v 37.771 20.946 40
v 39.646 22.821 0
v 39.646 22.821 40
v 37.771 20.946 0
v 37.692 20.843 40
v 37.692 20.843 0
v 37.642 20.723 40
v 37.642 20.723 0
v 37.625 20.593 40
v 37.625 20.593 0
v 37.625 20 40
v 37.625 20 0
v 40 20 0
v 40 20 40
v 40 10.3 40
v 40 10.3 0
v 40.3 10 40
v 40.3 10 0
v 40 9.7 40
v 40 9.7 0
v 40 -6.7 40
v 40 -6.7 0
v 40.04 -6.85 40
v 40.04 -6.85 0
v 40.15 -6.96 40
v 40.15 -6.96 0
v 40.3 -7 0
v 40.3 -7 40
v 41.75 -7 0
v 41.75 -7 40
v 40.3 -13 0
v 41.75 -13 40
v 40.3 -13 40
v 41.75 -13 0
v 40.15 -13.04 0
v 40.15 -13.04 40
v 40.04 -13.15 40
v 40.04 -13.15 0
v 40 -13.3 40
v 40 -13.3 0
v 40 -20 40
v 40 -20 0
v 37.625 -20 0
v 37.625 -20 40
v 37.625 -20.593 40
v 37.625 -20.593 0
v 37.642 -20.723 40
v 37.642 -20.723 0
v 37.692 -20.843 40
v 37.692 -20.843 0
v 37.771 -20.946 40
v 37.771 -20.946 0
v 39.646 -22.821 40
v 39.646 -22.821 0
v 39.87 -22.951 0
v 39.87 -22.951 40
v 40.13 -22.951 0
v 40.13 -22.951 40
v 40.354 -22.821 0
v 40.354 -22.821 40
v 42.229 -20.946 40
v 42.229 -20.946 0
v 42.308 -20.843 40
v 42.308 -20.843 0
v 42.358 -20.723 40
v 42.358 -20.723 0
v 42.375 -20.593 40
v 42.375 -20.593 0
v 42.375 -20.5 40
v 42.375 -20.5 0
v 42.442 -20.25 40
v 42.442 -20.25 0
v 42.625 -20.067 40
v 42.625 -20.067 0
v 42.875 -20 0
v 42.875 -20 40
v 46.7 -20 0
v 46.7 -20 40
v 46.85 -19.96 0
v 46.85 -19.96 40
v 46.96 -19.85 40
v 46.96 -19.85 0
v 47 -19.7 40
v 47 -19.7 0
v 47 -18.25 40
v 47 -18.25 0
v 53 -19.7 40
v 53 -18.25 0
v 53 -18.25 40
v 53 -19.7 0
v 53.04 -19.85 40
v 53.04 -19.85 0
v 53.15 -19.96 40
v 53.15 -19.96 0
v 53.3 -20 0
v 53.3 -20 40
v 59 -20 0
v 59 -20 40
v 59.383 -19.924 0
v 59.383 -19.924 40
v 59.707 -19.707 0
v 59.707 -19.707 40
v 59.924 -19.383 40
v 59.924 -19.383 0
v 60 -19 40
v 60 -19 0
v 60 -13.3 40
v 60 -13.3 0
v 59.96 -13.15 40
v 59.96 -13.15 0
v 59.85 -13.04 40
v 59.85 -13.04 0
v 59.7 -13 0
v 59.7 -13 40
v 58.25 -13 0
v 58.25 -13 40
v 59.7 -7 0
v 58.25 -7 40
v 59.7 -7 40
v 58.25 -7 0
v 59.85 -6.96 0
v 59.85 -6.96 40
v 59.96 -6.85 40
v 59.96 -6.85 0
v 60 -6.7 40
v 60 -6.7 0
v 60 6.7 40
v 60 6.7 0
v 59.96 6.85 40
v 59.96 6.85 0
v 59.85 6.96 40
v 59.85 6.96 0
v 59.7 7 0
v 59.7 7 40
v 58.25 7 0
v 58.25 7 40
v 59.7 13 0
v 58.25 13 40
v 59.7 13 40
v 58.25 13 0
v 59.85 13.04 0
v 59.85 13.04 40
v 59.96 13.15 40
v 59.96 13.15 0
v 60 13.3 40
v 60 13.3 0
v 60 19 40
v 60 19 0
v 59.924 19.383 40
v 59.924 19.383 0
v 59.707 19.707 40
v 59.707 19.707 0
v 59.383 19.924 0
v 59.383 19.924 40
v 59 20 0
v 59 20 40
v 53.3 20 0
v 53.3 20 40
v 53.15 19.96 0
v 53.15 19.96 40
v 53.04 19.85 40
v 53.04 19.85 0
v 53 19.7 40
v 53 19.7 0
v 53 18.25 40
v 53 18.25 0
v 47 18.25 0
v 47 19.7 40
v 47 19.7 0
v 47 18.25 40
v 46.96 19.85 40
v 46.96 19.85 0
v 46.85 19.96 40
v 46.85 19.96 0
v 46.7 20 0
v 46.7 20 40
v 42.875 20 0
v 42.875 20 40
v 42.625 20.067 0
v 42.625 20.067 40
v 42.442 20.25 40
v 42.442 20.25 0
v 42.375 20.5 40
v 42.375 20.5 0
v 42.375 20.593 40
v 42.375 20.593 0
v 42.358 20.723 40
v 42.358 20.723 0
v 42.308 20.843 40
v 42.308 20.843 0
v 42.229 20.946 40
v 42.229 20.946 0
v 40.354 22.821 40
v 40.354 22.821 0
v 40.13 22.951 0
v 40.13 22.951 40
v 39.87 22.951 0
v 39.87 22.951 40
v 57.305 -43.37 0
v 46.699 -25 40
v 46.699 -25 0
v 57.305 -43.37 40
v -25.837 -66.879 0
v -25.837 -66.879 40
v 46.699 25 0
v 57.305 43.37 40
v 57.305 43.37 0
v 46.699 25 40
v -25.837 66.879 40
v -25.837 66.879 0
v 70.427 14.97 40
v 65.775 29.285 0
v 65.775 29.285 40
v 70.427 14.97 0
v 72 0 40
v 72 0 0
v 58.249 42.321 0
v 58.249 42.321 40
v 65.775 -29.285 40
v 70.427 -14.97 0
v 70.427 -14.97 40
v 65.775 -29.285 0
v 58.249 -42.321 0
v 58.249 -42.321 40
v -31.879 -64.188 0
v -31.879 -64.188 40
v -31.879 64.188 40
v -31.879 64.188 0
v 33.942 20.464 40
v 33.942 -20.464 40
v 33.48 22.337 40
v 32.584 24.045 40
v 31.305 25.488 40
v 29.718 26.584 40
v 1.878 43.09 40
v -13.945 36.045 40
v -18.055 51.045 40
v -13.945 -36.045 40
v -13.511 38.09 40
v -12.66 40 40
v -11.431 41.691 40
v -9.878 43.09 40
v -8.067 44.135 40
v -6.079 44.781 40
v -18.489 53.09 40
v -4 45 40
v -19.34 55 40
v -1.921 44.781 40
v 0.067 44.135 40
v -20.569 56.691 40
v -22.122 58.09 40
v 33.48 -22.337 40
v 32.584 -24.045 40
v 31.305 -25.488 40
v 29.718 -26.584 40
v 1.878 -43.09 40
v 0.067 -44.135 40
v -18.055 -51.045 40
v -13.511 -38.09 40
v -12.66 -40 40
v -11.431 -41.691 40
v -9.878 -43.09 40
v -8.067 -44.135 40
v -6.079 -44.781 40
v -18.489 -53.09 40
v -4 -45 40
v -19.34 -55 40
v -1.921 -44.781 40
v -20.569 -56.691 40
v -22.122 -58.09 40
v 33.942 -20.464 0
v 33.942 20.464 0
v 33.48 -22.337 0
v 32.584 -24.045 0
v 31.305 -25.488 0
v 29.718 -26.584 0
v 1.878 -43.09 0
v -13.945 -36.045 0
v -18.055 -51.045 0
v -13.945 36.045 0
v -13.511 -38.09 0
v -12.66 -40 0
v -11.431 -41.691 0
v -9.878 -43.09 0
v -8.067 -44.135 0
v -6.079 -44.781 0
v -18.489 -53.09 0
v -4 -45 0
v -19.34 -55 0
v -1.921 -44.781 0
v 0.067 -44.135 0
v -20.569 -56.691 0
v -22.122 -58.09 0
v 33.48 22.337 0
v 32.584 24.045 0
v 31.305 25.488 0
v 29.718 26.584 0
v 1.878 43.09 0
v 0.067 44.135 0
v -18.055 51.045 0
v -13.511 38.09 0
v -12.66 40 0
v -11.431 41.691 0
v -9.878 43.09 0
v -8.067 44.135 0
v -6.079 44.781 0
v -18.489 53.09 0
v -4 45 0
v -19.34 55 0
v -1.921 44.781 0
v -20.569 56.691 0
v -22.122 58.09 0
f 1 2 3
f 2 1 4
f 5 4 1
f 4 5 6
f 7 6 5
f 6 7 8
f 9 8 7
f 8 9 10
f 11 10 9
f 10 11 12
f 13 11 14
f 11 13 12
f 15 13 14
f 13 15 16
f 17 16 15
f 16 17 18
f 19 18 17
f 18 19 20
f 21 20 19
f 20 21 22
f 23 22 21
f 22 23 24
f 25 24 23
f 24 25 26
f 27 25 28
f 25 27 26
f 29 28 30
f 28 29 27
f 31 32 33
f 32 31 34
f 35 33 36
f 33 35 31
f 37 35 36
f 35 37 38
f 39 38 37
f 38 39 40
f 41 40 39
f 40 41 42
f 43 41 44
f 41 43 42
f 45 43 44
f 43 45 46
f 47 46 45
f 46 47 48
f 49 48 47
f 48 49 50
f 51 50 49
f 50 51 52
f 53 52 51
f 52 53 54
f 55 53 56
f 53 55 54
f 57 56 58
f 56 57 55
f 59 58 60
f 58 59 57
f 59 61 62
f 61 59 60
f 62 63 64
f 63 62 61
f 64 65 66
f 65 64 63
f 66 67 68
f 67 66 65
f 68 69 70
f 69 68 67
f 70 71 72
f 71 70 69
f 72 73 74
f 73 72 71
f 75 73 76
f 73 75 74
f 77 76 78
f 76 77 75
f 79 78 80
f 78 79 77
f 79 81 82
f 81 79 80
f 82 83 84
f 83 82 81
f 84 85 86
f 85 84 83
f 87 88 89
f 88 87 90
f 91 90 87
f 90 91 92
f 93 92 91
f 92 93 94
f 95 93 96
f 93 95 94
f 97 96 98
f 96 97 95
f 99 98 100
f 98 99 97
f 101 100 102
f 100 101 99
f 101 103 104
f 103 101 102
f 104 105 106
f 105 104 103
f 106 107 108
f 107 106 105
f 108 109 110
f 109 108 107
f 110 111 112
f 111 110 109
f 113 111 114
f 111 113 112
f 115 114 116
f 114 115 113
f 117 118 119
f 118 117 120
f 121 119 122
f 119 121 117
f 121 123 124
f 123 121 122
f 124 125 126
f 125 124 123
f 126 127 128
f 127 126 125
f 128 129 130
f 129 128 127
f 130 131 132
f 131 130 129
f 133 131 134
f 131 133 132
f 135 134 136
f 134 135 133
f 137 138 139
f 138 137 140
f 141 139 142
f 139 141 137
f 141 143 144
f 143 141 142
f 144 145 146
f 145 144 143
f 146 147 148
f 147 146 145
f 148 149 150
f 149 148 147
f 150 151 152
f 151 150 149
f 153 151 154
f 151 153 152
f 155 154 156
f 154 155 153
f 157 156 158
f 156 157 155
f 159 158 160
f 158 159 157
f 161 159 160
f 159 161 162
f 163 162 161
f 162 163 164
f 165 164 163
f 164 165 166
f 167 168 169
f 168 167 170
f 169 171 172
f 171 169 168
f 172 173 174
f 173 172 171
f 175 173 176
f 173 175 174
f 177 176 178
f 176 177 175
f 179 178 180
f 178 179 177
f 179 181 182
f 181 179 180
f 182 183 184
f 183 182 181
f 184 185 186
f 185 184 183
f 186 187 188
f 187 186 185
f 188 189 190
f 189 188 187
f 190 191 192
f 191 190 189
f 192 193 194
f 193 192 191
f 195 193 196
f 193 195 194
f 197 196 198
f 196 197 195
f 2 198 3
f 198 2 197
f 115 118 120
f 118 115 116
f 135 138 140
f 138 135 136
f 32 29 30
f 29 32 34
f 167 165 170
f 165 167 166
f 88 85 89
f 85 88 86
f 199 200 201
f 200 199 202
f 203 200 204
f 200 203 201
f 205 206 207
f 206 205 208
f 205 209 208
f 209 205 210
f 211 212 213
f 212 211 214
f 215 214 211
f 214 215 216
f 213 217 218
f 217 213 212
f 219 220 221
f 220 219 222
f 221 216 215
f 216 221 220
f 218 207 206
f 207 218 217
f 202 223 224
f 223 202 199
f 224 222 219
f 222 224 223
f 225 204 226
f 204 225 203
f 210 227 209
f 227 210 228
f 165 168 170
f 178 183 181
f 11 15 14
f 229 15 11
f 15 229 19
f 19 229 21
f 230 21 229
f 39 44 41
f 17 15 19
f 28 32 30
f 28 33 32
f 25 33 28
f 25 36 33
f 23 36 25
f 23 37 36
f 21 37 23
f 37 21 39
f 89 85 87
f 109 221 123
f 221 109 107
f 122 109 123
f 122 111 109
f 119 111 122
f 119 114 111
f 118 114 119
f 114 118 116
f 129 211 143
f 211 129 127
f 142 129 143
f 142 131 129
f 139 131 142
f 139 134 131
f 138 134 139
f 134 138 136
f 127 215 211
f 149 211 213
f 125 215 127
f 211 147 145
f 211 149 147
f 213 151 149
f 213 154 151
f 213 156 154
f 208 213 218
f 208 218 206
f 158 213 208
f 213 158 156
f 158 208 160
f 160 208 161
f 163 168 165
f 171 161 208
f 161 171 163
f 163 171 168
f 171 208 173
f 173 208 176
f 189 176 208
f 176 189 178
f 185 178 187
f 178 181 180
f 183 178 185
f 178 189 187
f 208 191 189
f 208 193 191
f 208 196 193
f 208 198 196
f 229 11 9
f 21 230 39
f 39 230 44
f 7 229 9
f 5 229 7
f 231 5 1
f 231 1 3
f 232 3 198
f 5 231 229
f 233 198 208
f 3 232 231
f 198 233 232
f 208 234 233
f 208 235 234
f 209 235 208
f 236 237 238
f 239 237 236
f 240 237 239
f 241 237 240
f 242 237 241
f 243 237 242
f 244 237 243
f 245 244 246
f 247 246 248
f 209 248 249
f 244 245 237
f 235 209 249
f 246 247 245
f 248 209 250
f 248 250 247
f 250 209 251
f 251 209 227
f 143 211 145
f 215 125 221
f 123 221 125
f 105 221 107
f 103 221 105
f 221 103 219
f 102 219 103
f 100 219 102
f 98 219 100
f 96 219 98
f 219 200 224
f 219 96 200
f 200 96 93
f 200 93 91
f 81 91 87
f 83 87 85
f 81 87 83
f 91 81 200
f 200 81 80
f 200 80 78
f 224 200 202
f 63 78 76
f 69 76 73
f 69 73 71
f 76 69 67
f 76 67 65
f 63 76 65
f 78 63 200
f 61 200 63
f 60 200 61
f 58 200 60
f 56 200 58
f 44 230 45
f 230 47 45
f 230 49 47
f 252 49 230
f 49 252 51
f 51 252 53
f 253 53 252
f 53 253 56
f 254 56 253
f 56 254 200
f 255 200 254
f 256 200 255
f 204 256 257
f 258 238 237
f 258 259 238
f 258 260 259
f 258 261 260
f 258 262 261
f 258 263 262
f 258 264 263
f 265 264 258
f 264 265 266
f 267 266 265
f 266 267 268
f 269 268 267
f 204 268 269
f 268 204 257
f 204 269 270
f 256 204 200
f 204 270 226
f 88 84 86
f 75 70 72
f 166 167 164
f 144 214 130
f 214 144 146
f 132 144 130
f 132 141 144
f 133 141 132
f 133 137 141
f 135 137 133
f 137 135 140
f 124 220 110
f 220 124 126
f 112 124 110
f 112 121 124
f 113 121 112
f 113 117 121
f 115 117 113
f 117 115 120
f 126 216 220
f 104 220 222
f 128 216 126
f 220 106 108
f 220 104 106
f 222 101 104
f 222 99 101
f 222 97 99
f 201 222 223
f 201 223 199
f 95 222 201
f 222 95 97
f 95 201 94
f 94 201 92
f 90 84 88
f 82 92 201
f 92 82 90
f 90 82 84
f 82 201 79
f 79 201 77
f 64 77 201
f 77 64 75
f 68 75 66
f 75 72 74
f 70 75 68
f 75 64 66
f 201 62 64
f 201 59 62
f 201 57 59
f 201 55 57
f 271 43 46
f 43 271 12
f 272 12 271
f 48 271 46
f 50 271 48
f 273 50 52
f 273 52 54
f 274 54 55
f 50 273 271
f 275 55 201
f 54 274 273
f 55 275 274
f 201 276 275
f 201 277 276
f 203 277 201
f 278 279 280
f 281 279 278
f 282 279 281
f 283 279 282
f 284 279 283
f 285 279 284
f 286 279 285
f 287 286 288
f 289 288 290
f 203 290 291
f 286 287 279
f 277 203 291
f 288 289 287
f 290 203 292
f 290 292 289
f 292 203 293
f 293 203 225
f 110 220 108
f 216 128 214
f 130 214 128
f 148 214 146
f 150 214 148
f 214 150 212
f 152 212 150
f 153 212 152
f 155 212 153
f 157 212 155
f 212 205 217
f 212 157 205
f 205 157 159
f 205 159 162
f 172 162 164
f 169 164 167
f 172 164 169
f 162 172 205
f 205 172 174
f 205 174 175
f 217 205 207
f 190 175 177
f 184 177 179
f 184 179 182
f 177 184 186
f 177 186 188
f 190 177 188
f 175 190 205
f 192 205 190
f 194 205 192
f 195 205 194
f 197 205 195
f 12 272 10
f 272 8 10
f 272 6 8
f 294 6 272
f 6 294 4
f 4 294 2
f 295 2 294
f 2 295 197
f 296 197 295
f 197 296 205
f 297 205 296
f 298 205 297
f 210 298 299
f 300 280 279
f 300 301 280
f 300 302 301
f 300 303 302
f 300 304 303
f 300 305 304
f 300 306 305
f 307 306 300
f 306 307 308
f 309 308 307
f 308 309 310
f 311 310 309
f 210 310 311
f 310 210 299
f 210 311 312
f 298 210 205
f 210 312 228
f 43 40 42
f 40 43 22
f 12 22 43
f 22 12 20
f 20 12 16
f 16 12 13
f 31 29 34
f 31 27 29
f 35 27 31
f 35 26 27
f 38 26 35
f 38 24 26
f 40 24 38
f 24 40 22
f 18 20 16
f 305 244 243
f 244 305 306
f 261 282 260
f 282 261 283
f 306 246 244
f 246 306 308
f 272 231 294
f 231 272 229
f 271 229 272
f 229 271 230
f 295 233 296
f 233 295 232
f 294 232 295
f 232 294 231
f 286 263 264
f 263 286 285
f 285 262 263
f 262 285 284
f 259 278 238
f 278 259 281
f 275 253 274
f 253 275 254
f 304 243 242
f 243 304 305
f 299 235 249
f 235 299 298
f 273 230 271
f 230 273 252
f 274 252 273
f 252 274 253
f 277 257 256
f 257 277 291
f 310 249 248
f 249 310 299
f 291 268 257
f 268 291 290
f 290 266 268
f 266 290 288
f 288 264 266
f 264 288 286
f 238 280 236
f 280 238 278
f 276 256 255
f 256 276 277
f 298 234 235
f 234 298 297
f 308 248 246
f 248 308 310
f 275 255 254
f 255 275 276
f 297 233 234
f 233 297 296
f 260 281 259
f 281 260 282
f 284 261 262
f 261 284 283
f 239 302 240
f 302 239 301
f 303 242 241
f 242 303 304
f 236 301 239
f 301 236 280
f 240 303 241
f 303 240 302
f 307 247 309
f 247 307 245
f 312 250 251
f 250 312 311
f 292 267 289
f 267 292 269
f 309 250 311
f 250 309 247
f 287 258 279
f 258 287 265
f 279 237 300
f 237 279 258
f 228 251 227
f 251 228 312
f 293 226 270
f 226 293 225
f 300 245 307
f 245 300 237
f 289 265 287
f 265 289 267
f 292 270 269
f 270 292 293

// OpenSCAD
// file: makerslide.scad
module makerslide(h=100) {
	linear_extrude(height=h, center=true, convexity = 10)
		import("makerslide/makerslide_extrusion_profile.dxf");
}

makerslide(50);
// main file
use <makerslide.scad>

thick= 4;
extrusion_width= 40;
extrusion_height= 20;
base_cylinder_r= 72;
arm_length= 60;

frame_motor();
//spool_cutout();

module cutout(clearance=0.1) {
	t= 3.5;
	union() {
		translate([10,0,extrusion_width/2]) rotate([0, 0, 180]) makerslide(extrusion_width+2);
		translate([0,0,extrusion_width/2]) cube([20-t,40-t,extrusion_width+2], center= true);
	}
}

module frame_motor() {
	difference() {
		cylinder(r=base_cylinder_r, h=extrusion_width);
		// makerslide cutout
		translate([extrusion_height/2+40,0,-0.5]) cutout();
		// cutout arms
		translate([90,0,-1]) arms();
		// back cutout
		translate([0,0,-1]) rotate([0, 0, -90]) spool_cutout();
		// motor cutout
		translate([-58,0,-1]) rotate([0, 0, -90]) motor_cutout();	
	}
}

module arms() {
	rotate([0,0,30]) translate([-200, -extrusion_height*2,0]) cube([150, extrusion_height*2, extrusion_width+2]);
	rotate([0,0,-30]) translate([-200, 0,0]) cube([150, extrusion_height*2, extrusion_width+2]);
}

module spool_cutout() {
	r1= 10;
	r2= 8;
	t1= 90-r1*2;
	t2= 55-r2*2;
	d= 30;
	translate([0,-4,0]) linear_extrude(height= extrusion_width+2) hull() {
		translate([t1/2,0,0]) circle(r= r1);
		translate([-t1/2,0,0]) circle(r= r1);
		translate([t2/2,d,0]) circle(r= r2);
		translate([-t2/2,d,0]) circle(r= r2);
	}

}

module motor_cutout() {
	r1= 10;
	r2= 10;
	t2= 120-r2*2;
	t1= 170-r1*2;
	d= 40;
	translate([0,-10,0]) linear_extrude(height= extrusion_width+2) hull() {
		translate([t1/2,0,0]) circle(r= r1);
		translate([-t1/2,0,0]) circle(r= r1);
		translate([t2/2,d,0]) circle(r= r2);
		translate([-t2/2,d,0]) circle(r= r2);
	}

}
